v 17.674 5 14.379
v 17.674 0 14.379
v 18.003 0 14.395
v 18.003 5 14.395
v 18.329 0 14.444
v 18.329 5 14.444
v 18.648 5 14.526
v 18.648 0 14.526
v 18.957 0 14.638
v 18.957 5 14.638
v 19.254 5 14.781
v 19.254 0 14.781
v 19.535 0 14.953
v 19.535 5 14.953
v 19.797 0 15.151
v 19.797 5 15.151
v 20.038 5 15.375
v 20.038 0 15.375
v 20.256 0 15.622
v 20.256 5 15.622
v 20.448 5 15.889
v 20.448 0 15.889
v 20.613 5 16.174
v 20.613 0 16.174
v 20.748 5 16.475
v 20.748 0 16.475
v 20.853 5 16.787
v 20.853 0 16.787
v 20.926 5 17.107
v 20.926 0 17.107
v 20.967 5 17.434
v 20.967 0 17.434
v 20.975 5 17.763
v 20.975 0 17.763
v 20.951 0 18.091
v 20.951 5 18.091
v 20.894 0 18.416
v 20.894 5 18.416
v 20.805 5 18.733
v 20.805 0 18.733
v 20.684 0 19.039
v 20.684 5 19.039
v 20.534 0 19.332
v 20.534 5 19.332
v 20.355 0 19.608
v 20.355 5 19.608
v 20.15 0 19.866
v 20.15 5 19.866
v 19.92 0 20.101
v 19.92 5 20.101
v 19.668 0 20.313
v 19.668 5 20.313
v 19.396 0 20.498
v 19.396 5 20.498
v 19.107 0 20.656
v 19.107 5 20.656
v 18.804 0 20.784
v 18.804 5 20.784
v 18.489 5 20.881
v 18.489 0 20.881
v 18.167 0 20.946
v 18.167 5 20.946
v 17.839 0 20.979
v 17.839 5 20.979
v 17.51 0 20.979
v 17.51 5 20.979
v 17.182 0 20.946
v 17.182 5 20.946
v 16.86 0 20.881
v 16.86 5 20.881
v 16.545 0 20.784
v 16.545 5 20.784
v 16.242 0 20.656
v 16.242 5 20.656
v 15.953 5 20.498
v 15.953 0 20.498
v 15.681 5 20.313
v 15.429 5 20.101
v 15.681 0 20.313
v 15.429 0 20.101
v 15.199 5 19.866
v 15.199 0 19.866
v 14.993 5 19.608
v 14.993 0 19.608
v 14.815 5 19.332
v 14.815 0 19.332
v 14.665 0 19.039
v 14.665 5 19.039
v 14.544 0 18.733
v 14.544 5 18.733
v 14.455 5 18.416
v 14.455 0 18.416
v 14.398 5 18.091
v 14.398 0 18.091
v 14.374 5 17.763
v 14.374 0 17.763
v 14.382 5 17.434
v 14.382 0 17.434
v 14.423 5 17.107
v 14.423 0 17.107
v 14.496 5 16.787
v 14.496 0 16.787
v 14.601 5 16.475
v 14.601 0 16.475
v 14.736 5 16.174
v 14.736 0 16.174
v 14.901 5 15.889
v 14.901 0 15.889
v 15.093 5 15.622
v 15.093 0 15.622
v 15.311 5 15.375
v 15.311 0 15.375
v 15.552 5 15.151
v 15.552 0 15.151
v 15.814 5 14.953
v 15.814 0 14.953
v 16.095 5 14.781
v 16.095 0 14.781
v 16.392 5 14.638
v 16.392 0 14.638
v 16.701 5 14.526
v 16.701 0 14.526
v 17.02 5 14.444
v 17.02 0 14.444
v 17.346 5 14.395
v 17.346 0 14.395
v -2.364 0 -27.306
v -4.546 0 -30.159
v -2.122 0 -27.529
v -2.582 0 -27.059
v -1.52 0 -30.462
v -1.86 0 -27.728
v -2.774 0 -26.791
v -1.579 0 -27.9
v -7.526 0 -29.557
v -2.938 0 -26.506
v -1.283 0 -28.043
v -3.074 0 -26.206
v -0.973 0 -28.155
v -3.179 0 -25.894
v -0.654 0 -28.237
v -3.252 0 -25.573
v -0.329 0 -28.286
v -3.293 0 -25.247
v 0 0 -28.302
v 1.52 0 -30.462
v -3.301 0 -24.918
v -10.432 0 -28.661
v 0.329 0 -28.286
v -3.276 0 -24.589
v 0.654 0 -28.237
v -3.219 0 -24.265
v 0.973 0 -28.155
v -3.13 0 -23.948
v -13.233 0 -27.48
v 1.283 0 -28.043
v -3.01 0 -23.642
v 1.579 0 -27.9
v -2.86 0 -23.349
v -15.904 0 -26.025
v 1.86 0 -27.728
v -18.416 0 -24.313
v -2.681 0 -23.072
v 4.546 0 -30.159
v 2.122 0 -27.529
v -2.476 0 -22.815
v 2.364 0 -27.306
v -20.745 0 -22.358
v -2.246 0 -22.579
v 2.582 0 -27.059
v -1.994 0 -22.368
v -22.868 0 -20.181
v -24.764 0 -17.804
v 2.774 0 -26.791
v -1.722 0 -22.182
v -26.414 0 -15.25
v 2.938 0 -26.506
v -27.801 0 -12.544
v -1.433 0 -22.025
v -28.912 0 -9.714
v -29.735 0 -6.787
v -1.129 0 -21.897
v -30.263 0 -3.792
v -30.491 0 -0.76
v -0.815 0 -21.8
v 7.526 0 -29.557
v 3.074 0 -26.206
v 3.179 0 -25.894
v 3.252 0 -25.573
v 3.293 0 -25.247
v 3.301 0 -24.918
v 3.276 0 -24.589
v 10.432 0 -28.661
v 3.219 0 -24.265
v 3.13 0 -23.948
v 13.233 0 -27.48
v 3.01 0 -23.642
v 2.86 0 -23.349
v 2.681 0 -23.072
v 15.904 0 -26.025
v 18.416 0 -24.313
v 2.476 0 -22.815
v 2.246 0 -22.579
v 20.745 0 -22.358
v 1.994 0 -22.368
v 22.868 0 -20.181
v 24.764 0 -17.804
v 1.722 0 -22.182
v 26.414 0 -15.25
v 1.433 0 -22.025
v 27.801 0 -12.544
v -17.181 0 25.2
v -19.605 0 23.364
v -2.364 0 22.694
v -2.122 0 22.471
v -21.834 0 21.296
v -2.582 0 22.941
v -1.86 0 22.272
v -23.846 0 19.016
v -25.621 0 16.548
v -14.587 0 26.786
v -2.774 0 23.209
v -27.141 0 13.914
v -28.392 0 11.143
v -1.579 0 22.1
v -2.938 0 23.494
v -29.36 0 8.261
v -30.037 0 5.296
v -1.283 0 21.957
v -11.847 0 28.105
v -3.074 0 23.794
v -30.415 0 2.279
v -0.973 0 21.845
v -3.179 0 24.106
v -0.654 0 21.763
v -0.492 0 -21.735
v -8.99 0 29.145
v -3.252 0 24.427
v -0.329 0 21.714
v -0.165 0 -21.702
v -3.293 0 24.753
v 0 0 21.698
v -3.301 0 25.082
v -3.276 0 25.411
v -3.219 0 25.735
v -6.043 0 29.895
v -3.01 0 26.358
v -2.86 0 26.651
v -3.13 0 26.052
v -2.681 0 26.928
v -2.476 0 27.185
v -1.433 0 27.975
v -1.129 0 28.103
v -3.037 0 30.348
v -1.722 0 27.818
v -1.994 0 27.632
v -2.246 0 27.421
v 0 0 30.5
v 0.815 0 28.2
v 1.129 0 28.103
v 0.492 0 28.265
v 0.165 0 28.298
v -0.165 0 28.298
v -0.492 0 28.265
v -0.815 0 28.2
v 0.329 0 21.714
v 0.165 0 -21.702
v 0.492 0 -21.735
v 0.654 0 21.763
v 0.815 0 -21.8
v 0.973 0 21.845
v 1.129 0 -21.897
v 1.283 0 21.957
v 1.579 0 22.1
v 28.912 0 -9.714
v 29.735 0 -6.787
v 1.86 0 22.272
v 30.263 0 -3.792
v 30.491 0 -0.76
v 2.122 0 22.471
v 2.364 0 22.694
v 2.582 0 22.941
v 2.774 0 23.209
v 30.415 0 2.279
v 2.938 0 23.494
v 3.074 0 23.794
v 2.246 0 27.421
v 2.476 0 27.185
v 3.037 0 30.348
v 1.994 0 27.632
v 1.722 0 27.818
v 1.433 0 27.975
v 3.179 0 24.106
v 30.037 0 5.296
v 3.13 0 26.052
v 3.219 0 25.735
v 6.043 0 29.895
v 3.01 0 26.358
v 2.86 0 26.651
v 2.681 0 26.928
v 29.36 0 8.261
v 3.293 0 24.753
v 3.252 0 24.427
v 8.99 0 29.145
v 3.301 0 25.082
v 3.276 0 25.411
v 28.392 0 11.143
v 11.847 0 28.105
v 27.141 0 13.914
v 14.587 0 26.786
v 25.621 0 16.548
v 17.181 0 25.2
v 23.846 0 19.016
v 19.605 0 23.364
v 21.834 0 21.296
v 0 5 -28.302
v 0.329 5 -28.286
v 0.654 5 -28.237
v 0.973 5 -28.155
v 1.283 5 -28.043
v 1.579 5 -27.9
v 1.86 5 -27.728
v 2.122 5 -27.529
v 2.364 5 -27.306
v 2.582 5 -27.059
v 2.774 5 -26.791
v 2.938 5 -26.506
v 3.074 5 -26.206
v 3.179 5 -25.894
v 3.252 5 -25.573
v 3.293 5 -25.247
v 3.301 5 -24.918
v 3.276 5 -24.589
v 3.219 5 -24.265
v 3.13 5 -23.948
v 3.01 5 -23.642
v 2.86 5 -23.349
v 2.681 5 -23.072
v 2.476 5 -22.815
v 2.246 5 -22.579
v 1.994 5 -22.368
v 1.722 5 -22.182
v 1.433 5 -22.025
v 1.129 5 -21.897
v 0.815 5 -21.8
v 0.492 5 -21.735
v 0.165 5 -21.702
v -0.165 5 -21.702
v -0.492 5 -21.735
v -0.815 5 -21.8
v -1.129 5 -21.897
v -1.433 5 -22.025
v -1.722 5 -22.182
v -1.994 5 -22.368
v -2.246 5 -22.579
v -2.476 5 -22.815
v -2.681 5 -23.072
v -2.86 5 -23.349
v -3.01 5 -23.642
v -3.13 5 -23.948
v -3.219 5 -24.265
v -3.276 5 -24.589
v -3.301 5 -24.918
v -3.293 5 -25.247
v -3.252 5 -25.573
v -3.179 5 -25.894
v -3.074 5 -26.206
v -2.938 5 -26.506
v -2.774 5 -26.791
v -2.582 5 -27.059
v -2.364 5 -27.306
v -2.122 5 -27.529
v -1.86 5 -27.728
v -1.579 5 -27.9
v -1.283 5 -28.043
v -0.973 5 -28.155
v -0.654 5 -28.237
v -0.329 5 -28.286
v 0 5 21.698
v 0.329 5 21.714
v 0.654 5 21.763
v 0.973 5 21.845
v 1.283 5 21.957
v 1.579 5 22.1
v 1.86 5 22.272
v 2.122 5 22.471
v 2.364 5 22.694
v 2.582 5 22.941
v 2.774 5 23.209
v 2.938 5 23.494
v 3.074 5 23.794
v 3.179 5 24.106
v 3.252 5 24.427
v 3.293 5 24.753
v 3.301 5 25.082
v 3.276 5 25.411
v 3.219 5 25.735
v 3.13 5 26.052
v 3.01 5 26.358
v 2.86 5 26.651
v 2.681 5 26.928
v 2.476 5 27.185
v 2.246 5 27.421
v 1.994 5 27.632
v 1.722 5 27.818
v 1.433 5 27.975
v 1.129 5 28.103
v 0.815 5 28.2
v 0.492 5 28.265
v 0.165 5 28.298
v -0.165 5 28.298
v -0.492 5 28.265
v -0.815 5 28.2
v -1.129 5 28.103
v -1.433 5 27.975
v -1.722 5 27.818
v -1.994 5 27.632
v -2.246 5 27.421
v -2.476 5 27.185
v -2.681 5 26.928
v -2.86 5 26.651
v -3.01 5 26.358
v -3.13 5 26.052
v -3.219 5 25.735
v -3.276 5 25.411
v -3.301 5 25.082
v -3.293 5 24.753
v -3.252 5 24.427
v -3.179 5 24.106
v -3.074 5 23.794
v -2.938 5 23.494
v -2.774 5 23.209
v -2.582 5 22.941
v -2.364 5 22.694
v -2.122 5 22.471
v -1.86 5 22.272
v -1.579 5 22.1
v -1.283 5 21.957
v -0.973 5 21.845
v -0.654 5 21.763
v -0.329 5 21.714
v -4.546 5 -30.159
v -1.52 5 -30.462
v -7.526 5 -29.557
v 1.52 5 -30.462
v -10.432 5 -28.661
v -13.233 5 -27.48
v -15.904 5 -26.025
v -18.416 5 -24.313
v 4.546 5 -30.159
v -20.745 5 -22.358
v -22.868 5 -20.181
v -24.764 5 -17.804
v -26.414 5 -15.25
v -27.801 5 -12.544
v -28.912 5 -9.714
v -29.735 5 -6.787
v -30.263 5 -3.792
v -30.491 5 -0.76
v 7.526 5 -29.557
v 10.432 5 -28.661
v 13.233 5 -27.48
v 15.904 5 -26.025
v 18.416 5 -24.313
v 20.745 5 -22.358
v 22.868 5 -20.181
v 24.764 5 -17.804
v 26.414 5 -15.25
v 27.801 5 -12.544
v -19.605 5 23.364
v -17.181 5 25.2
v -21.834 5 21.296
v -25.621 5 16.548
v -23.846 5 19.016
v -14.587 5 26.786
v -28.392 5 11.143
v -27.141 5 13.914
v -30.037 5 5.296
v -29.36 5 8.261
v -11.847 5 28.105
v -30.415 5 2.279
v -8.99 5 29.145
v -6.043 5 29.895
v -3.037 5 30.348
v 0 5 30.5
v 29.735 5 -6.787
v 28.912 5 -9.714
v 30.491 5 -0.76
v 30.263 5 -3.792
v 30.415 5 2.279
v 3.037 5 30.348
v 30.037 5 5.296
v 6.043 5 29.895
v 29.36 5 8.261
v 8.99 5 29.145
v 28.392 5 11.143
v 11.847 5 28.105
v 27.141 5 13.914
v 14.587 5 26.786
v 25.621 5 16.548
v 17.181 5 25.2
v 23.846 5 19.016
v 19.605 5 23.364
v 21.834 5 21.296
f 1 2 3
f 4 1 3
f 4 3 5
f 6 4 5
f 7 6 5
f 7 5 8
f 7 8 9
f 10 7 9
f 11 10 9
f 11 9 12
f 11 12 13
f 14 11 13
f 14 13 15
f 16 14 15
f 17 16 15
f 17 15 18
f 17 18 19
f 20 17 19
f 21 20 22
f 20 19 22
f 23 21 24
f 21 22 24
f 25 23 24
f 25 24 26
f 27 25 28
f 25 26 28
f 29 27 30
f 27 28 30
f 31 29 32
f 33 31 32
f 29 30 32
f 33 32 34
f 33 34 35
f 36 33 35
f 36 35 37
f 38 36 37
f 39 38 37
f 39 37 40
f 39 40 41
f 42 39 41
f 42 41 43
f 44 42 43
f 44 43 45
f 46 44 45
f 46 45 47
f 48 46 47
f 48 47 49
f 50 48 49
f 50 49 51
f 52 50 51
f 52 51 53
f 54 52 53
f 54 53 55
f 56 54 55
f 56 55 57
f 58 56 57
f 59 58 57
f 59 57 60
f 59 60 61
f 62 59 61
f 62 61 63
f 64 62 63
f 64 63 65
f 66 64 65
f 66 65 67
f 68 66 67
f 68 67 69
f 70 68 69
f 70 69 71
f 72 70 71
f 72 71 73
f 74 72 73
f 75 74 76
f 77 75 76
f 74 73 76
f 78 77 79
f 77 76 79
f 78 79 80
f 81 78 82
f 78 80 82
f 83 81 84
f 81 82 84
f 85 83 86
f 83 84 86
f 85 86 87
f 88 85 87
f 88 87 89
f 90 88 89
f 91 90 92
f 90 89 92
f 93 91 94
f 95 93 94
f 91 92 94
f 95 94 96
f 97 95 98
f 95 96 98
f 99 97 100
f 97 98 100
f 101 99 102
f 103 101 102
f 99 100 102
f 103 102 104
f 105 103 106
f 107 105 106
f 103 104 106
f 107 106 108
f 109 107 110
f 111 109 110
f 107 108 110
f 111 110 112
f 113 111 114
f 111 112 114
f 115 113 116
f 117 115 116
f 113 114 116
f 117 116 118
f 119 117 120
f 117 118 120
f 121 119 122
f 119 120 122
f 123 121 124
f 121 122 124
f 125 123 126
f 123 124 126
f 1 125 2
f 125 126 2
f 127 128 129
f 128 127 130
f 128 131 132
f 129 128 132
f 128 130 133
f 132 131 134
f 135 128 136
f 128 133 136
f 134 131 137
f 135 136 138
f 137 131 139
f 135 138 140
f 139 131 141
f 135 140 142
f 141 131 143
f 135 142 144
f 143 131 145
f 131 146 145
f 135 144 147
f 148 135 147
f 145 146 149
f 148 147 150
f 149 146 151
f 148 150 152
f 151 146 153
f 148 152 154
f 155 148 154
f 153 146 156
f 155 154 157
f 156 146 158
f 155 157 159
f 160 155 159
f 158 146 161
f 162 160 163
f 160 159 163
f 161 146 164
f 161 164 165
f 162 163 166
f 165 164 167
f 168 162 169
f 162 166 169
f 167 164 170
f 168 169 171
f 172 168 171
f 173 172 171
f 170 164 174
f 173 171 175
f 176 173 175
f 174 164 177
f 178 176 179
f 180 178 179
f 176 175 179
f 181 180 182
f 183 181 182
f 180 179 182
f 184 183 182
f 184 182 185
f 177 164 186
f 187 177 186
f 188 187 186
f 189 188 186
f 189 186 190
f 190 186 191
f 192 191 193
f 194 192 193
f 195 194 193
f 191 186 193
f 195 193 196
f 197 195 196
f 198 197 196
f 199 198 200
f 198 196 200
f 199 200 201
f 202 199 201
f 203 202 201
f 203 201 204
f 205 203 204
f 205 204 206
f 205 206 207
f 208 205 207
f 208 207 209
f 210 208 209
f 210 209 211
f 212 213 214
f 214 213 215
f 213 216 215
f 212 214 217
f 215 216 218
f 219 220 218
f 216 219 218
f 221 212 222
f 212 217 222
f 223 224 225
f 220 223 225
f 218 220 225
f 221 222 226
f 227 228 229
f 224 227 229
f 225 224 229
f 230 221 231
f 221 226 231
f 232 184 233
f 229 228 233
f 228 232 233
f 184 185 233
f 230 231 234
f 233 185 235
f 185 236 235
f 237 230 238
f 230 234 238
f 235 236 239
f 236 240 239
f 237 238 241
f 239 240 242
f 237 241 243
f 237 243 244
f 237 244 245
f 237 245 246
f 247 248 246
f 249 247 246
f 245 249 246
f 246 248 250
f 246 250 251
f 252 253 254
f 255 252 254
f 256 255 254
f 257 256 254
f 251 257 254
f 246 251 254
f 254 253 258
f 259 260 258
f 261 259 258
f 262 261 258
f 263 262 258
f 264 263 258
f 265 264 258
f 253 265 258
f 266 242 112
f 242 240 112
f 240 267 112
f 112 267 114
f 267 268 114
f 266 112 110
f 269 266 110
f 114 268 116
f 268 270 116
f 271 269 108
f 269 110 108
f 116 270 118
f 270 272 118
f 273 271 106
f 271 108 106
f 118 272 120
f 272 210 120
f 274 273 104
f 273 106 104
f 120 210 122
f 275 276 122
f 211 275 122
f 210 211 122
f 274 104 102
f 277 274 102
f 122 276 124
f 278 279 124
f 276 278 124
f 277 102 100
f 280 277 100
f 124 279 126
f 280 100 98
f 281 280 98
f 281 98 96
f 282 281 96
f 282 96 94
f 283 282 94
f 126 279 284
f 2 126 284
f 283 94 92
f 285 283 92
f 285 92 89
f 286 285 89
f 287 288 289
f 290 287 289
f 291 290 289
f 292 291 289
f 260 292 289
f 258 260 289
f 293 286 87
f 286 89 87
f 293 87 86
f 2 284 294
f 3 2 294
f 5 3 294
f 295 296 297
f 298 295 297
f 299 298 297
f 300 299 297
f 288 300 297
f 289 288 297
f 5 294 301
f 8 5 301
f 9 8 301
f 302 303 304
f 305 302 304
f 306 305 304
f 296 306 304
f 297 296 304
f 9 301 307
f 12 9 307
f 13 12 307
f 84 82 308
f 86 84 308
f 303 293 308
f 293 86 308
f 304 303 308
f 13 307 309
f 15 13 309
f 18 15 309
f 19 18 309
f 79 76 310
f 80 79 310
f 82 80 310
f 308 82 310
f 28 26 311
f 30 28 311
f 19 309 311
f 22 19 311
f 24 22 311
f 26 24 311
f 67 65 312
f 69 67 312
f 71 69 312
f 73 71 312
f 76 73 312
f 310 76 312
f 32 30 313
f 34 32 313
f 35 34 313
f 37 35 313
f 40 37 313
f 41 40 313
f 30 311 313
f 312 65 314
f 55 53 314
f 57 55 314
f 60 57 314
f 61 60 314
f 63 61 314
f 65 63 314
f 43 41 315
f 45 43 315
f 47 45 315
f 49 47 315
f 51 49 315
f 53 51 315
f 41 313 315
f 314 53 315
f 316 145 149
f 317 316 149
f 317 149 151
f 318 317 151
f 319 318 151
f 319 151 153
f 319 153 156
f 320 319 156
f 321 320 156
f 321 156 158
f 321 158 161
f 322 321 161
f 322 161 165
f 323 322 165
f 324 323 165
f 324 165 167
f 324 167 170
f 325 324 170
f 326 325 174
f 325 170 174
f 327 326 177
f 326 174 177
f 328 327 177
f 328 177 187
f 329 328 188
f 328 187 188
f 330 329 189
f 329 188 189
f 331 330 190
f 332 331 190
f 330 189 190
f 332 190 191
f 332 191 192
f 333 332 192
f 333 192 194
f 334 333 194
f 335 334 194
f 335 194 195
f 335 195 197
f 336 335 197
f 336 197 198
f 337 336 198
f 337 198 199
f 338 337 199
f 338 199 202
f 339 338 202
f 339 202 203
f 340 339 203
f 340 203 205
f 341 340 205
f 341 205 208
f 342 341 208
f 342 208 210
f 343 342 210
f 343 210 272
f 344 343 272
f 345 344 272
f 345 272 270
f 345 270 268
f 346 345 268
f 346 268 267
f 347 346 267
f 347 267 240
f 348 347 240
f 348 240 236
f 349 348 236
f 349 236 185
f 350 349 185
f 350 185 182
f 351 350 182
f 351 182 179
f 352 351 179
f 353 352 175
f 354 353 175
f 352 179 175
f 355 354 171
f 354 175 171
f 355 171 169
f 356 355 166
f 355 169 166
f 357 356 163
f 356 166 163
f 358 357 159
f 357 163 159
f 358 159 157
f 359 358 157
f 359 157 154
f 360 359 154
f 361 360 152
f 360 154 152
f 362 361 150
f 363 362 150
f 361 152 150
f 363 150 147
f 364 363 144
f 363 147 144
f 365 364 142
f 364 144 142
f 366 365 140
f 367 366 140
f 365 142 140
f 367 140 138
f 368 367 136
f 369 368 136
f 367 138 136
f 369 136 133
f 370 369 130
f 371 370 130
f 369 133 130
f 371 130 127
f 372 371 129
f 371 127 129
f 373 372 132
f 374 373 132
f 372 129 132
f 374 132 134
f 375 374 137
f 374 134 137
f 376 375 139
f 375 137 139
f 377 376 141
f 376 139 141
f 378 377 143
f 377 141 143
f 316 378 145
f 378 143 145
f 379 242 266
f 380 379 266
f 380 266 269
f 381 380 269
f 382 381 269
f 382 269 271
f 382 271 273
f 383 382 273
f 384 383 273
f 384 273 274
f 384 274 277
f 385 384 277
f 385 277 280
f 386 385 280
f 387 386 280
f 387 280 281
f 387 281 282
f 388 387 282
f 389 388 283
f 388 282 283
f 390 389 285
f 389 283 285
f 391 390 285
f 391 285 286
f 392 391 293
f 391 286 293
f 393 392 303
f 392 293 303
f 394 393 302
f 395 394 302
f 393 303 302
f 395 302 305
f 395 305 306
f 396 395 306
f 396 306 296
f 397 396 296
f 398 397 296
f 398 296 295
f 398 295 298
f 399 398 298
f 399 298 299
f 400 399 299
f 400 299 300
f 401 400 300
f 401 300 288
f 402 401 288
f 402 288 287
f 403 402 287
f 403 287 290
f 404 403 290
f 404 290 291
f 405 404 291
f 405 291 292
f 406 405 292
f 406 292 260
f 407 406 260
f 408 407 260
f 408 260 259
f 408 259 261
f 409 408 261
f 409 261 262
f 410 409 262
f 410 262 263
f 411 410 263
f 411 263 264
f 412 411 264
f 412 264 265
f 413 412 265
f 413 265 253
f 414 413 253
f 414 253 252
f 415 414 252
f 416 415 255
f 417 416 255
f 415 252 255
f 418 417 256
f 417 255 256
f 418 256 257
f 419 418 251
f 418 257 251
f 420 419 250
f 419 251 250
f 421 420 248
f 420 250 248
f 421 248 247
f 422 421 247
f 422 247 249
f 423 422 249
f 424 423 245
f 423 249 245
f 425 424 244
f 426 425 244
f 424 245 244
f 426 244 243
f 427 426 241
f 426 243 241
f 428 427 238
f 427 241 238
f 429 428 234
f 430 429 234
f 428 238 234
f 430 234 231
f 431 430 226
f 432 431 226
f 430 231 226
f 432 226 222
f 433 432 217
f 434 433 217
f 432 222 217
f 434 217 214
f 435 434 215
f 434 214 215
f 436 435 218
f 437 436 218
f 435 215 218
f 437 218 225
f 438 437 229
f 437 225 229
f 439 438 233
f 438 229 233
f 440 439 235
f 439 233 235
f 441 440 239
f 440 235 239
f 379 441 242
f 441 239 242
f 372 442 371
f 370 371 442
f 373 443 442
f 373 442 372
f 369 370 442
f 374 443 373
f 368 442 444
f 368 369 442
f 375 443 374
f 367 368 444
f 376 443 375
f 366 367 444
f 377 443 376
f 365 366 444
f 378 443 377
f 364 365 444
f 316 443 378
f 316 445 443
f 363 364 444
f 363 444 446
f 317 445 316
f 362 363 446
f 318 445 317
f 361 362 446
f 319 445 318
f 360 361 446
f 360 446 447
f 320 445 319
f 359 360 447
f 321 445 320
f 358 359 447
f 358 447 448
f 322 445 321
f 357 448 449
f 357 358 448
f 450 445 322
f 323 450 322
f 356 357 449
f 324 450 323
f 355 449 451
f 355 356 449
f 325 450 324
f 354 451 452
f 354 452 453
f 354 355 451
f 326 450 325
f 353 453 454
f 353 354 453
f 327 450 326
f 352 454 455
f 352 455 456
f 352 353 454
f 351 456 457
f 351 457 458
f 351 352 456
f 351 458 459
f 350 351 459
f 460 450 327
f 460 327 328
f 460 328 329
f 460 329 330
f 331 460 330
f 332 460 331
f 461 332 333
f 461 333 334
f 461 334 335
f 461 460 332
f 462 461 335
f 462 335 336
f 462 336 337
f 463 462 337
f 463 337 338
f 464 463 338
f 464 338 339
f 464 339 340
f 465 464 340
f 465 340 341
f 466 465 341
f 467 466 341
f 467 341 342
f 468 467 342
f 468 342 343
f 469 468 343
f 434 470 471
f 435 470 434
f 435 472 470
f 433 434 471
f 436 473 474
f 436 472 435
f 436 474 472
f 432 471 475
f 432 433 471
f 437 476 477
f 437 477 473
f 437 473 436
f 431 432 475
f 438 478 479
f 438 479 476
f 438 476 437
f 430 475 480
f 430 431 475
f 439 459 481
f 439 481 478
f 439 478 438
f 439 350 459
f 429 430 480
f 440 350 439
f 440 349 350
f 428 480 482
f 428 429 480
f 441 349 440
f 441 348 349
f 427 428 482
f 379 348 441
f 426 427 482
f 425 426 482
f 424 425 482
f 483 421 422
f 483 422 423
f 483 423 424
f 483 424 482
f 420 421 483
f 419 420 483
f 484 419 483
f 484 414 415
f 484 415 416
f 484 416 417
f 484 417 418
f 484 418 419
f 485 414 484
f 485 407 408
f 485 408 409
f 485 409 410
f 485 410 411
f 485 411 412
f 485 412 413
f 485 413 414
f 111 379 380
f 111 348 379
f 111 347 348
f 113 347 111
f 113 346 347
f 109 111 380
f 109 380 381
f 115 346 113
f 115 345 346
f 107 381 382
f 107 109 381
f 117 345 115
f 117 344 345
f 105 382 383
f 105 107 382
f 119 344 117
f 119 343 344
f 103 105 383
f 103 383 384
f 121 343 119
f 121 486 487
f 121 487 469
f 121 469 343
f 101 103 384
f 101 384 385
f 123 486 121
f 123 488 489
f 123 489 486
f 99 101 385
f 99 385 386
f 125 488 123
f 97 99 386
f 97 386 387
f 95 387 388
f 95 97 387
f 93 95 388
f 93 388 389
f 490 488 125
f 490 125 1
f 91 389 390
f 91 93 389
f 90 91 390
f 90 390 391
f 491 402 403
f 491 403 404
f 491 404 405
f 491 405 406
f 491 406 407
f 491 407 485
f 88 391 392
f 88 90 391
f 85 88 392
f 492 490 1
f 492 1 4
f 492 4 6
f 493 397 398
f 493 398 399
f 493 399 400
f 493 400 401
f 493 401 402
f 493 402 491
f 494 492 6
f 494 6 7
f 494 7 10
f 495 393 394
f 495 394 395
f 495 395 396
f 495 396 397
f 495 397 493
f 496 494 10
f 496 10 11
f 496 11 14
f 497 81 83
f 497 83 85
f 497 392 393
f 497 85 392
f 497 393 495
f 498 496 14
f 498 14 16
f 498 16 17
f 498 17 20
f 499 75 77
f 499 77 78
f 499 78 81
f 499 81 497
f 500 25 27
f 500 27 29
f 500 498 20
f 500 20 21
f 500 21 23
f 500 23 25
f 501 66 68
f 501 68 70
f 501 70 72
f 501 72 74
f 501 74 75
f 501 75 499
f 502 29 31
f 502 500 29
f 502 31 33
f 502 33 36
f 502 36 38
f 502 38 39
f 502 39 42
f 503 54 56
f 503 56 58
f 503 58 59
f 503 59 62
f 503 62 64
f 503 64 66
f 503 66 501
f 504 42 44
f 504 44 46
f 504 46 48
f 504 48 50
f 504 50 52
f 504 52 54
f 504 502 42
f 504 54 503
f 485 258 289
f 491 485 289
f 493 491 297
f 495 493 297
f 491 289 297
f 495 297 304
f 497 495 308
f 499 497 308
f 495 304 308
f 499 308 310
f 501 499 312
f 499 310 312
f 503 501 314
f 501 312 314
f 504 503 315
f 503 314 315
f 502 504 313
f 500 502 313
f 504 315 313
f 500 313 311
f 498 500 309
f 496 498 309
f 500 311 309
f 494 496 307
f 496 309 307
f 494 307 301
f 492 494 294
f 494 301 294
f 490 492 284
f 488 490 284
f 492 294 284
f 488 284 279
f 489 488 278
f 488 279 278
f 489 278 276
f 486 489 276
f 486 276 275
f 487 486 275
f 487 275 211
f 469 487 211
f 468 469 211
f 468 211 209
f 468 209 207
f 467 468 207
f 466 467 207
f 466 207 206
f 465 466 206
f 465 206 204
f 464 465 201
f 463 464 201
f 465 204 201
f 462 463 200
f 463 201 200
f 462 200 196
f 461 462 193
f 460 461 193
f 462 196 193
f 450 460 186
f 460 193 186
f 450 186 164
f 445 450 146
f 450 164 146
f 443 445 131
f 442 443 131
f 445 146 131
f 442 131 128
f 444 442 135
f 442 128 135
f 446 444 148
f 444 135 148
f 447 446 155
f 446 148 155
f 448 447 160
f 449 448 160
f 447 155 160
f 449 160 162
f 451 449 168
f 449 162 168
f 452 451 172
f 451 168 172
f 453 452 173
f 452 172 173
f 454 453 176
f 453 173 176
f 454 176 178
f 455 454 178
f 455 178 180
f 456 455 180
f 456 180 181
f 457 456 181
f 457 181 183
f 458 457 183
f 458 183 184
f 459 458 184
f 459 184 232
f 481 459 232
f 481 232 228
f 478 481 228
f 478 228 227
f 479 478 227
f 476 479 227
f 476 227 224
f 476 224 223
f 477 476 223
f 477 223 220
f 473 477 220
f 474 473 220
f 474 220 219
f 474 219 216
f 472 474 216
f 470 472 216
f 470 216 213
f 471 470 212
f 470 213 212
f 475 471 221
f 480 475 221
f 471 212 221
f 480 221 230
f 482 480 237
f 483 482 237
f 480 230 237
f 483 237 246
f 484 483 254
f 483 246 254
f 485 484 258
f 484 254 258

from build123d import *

# Parameters (mm, degrees)
SKETCH1_R           = 30.5
BOSS_EXTRUDE1_DEPTH = 5
SKETCH4_R           = 3.302
CUT_EXTRUDE2_DEPTH  = 5.08
SKETCH5_R           = 3.302
CUT_EXTRUDE3_DEPTH  = 5.08
SKETCH6_R           = 3.302
CUT_EXTRUDE4_DEPTH  = 5.08


with BuildPart() as part:
    # Sketch1 → Boss-Extrude1 (new body)
    with BuildSketch(Plane(origin=(0, 0, 0), x_dir=(1, 0, 0), z_dir=(0, 1, 0))):
        with Locations(Location((0, 0, 0), (0, 0, 270))):
            Circle(SKETCH1_R)
    extrude(amount=BOSS_EXTRUDE1_DEPTH)

    # Sketch4 → Cut-Extrude2 (cut)
    with BuildSketch(Plane(origin=(0, 0, 0), x_dir=(-1, 0, 0), z_dir=(0, -1, 0))):
        with Locations(Location((0, 25, 0), (0, 0, 90))):
            Circle(SKETCH4_R)
    extrude(amount=-CUT_EXTRUDE2_DEPTH, mode=Mode.SUBTRACT)

    # Sketch5 → Cut-Extrude3 (cut)
    with BuildSketch(Plane.XZ):
        with Locations(Location((0, 25, 0), (0, 0, 270))):
            Circle(SKETCH5_R)
    extrude(amount=-CUT_EXTRUDE3_DEPTH, mode=Mode.SUBTRACT)

    # Sketch6 → Cut-Extrude4 (cut)
    with BuildSketch(Plane.XZ):
        with Locations(Location((17.674476483, 17.680862, 0), (0, 0, 270))):
            Circle(SKETCH6_R)
    extrude(amount=-CUT_EXTRUDE4_DEPTH, mode=Mode.SUBTRACT)


solid = part.part
